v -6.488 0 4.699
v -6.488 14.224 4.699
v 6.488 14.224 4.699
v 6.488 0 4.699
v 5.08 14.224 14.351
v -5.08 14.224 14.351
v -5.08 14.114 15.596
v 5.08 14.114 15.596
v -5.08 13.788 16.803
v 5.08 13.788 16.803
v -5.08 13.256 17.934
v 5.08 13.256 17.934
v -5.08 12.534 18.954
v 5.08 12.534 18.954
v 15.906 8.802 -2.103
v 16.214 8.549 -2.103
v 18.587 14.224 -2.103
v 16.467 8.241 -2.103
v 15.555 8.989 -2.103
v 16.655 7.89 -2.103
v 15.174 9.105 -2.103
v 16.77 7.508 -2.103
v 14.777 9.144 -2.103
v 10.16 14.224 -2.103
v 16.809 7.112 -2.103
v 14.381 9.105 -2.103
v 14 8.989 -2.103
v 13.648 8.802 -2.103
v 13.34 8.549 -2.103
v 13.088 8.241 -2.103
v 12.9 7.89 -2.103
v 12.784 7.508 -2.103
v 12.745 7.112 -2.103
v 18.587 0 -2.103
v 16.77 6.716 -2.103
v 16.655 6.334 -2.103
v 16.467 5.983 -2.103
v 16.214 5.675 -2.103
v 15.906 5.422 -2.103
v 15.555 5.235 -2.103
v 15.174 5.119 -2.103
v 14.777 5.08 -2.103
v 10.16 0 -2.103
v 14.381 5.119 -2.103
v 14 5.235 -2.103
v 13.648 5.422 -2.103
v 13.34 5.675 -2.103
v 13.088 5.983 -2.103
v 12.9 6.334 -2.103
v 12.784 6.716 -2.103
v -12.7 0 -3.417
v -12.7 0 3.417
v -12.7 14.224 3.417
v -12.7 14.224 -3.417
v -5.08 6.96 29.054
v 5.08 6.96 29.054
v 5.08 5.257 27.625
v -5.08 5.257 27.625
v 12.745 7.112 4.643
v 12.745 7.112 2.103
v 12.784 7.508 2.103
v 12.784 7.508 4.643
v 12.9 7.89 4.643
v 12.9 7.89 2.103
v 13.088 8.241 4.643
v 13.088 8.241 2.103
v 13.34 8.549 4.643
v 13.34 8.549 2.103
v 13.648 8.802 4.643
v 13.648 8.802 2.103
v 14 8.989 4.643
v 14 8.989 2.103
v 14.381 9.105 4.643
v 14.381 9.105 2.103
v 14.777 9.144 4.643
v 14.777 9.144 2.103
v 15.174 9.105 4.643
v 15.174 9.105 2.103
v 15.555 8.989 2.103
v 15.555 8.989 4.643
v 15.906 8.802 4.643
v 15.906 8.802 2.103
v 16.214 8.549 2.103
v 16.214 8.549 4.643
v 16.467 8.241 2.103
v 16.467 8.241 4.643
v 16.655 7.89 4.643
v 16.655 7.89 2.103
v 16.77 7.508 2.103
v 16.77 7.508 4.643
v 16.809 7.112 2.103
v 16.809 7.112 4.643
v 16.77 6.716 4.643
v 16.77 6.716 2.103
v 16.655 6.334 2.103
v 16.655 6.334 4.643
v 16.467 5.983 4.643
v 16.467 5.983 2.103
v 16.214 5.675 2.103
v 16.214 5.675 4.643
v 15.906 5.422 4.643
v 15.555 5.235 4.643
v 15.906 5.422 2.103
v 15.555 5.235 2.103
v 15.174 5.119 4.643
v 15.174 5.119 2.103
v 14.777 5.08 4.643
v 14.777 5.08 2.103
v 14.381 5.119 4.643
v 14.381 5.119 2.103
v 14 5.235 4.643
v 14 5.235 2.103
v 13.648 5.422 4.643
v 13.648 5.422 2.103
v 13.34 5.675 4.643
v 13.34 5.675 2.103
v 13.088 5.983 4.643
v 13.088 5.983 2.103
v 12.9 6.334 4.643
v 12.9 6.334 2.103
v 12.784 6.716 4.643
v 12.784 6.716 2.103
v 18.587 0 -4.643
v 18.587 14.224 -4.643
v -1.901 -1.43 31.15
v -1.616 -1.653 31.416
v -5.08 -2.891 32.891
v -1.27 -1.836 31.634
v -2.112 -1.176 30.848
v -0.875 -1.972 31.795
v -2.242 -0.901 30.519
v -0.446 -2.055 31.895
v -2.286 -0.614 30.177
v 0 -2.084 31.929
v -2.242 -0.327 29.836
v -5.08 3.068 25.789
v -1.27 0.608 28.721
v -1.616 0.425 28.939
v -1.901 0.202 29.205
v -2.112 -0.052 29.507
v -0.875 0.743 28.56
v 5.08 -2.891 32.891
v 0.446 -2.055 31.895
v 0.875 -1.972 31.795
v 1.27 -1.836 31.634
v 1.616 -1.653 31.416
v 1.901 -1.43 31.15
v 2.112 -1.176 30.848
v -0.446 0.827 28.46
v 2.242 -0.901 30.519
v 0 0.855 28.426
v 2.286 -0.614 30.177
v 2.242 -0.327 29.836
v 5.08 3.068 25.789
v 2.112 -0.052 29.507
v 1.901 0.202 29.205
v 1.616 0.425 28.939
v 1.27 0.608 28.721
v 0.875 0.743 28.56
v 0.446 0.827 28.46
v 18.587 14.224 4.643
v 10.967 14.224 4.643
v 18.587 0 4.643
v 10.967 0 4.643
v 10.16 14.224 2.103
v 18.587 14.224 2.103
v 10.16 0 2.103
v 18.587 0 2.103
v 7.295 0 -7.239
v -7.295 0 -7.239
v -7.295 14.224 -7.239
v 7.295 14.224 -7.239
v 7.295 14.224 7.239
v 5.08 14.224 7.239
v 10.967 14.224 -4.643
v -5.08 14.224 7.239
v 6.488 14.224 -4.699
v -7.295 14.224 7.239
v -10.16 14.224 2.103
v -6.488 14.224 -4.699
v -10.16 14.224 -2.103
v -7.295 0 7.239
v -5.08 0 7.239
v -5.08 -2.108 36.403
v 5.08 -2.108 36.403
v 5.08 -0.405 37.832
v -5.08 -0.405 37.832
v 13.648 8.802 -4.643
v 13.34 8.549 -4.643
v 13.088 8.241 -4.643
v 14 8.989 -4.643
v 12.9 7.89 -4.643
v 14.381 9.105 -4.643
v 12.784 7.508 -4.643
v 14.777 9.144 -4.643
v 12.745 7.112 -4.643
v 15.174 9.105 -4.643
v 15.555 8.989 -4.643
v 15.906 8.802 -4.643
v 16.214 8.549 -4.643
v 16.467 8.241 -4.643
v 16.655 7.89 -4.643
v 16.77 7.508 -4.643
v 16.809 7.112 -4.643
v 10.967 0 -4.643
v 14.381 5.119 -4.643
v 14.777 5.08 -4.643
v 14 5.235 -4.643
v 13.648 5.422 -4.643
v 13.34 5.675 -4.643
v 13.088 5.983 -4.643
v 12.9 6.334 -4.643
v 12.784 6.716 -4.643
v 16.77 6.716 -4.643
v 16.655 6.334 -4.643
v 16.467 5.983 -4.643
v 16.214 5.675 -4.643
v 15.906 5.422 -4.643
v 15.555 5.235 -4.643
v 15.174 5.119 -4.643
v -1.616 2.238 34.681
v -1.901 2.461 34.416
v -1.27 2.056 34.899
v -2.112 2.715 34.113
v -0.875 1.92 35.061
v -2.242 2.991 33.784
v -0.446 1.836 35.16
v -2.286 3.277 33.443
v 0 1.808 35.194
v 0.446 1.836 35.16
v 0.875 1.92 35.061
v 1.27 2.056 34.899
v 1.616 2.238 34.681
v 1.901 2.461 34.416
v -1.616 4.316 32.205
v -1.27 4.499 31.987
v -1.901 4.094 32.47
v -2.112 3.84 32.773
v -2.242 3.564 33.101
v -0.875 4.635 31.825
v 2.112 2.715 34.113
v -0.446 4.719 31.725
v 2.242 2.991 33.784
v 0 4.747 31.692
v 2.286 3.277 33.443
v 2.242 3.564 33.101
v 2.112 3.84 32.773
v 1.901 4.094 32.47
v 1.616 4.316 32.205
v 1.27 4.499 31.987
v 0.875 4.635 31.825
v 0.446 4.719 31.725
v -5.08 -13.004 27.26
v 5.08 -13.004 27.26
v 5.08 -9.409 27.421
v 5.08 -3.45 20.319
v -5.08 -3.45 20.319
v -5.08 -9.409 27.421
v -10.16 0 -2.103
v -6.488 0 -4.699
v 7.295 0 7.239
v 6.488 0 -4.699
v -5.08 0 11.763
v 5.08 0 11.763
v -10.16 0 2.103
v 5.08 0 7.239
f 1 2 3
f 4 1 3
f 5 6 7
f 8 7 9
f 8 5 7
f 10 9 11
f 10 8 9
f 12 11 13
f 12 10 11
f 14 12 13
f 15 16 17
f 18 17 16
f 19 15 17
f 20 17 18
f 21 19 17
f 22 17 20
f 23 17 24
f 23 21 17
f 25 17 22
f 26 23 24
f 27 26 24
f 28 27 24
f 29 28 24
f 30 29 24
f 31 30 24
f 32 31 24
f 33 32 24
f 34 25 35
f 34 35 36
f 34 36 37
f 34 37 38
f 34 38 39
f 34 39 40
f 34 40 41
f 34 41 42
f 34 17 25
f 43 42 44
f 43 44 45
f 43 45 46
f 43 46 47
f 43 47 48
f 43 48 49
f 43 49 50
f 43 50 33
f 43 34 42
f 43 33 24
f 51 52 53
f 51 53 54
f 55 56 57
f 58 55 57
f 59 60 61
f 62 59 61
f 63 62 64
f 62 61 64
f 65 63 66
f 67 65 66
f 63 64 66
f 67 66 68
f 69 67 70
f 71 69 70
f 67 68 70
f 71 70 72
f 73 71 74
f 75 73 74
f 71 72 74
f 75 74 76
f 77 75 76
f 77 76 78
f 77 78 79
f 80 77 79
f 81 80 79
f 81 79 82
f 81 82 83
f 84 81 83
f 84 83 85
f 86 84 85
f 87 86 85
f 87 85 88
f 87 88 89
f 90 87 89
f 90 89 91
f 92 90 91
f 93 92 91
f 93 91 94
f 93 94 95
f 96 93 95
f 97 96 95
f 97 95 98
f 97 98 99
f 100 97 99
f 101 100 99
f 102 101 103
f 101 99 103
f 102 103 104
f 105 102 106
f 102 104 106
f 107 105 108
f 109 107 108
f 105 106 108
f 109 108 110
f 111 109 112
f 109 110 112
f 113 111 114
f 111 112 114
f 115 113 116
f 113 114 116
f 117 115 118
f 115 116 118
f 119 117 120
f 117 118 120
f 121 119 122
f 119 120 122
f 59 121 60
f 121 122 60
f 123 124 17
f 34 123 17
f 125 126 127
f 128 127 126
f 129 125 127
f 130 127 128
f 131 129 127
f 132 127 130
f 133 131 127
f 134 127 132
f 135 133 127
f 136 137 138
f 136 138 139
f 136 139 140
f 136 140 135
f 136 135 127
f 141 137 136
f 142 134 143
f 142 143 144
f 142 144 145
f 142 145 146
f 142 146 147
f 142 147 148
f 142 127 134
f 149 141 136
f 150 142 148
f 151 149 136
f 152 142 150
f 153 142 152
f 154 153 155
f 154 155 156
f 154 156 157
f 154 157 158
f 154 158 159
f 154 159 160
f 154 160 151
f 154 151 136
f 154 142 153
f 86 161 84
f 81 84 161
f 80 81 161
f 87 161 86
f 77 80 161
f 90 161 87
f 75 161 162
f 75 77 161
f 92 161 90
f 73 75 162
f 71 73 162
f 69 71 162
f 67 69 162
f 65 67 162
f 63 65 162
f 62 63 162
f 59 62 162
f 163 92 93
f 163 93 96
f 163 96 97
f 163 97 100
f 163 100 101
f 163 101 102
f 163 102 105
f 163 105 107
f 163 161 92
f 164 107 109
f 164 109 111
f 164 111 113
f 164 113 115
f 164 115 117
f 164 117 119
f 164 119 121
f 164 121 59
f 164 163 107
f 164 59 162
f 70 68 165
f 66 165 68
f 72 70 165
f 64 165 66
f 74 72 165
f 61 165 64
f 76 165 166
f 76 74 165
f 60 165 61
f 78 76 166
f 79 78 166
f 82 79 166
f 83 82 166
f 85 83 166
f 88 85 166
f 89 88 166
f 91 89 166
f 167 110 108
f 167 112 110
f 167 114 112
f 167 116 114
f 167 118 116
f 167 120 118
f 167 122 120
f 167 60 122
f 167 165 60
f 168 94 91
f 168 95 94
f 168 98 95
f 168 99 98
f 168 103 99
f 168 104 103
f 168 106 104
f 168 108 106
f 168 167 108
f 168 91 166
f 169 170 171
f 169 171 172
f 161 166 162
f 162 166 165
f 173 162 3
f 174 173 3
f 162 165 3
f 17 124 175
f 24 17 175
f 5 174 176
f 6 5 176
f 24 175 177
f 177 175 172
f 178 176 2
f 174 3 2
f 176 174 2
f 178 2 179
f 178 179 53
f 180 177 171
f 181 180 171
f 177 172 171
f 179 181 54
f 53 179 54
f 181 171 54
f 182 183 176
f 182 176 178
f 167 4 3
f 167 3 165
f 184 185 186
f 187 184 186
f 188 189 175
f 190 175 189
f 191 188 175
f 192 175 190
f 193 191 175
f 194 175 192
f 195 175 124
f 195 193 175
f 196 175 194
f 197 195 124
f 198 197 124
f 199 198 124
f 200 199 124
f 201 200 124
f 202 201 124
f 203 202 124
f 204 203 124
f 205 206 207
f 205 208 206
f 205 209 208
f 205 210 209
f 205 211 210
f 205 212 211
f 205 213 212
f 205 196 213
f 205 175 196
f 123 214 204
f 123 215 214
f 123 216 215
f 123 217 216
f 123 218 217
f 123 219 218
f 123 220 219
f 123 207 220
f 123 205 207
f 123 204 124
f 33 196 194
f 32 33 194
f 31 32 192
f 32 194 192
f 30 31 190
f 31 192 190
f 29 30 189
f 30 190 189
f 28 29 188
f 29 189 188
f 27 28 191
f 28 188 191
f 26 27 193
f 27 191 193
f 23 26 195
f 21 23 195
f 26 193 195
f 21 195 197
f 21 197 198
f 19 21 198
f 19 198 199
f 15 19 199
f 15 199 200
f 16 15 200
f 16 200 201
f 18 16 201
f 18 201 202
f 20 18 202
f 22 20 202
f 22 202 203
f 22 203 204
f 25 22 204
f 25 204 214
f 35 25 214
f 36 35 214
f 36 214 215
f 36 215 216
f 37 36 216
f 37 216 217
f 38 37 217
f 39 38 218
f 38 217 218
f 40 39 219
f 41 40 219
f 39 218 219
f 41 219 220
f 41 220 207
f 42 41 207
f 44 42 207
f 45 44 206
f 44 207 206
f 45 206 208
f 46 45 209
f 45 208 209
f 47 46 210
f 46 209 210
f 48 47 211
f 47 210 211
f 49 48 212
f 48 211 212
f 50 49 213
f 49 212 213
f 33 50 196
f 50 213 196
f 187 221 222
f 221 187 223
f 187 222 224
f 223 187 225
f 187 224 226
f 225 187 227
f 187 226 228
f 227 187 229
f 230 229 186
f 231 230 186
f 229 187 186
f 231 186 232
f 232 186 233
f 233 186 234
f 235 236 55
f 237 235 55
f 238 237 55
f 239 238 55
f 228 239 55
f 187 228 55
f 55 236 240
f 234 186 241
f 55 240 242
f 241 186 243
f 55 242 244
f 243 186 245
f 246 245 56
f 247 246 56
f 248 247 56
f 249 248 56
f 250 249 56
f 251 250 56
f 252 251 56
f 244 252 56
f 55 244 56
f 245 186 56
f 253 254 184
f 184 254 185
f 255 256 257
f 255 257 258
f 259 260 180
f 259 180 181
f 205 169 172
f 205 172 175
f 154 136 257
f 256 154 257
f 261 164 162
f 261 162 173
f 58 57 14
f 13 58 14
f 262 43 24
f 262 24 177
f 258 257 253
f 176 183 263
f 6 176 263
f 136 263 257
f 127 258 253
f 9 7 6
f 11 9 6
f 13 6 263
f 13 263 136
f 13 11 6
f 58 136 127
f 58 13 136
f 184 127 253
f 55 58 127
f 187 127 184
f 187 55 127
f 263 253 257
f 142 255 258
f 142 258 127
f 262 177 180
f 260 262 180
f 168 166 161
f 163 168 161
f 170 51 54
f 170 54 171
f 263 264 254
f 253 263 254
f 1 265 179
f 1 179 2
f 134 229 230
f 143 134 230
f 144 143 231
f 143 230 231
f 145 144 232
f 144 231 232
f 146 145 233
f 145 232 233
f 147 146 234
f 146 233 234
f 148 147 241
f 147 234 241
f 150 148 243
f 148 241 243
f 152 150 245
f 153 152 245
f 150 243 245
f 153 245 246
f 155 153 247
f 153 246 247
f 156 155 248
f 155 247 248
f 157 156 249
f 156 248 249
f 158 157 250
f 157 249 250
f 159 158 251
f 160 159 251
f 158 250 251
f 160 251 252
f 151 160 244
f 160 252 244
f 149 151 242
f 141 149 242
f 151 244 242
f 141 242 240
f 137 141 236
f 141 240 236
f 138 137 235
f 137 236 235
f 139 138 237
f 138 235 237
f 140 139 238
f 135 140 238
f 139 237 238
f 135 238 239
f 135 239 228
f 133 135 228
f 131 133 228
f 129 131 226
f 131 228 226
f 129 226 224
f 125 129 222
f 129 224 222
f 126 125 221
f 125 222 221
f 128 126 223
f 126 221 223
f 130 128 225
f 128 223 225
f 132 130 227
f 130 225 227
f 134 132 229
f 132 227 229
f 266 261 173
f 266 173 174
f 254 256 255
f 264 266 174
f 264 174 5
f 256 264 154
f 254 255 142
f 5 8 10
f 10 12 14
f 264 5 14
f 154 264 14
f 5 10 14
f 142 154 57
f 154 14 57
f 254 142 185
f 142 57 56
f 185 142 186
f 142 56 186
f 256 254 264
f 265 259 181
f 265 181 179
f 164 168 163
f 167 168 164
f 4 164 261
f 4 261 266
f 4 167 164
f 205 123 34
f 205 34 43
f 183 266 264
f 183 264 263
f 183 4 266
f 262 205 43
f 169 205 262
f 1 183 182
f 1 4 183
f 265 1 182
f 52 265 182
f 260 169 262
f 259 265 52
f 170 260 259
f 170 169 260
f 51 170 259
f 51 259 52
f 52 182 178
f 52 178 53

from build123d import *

# Parameters (mm, degrees)
BOSS_EXTRUDE1_DEPTH = 14.224
SKETCH2_W           = 10.16
SKETCH2_H           = 14.224
BOSS_EXTRUDE2_DEPTH = 7.112
SKETCH3_W           = 10.16
SKETCH3_H           = 7.112
REVOLVE2_ANGLE      = 180
CUT_EXTRUDE2_REACH  = 37.062
SKETCH5_R           = 2.032
BOSS_EXTRUDE4_DEPTH = 10.16
SKETCH8_R           = 2.286
CUT_EXTRUDE3_DEPTH  = 5.08


with BuildPart() as part:
    # Sketch1 → Boss-Extrude1 (new body)
    with BuildSketch(Plane(origin=(0, 0, 0), x_dir=(1, 0, 0), z_dir=(0, 1, 0))):
        Polygon((-6.487826296, -4.699), (6.487826296, -4.699), (10.16, -2.102598059), (18.587251519, -2.102598059), (18.587251519, -4.642598059), (10.967251519, -4.642598059), (7.295077814, -7.239), (-7.295077814, -7.239), (-12.7, -3.417462245), (-12.7, 3.417462245), (-7.295077814, 7.239), (7.295077814, 7.239), (10.967251519, 4.642598059), (18.587251519, 4.642598059), (18.587251519, 2.102598059), (10.16, 2.102598059), (6.487826296, 4.699), (-6.487826296, 4.699), (-10.16, 2.102598059), (-10.16, -2.102598059), align=None)
    extrude(amount=BOSS_EXTRUDE1_DEPTH)

    # Sketch2 → Boss-Extrude2 (add)
    with BuildSketch(Plane.XY.offset(7.239)):
        with Locations((0, 7.112)):
            Rectangle(SKETCH2_W, SKETCH2_H)
    extrude(amount=BOSS_EXTRUDE2_DEPTH)

    # Sketch3 → Revolve2 (revolve)
    with BuildSketch(Plane.XY.offset(14.351)):
        with Locations((0, 10.668)):
            Rectangle(SKETCH3_W, SKETCH3_H)
    revolve(axis=Axis((-5.08, 7.112, 14.351), (1, 0, 0)), revolution_arc=REVOLVE2_ANGLE)

    # Cut-Extrude2: up to this face of the body (flat: up to its plane)
    cut_extrude2_end = Plane(part.part.faces().sort_by_distance((14.777251519, 7.112, 4.642598059))[0])
    # Sketch5 → Cut-Extrude2 (cut, up to the picked face)
    with BuildSketch(Plane(origin=(0, 0, -4.642598059), x_dir=(-1, 0, 0), z_dir=(0, 0, -1)), mode=Mode.PRIVATE) as cut_extrude2_sk1:
        with Locations((-14.777251519, 7.112)):
            Circle(SKETCH5_R)
    cut_extrude2_tool1 = split(extrude(cut_extrude2_sk1.sketch, amount=-CUT_EXTRUDE2_REACH, mode=Mode.PRIVATE), bisect_by=cut_extrude2_end, keep=Keep.BOTH, mode=Mode.PRIVATE)
    add(cut_extrude2_tool1.solids().sort_by(Axis((14.777252, 7.112, -4.642598), (0, 0, 1)))[0], mode=Mode.SUBTRACT)

    # Sketch7 → Boss-Extrude4 (add)
    with BuildSketch(Plane(origin=(5.08, 0, 0), x_dir=(0, 0, -1), z_dir=(1, 0, 0))):
        Polygon((-27.259989759, -13.003831416), (-36.402849284, -2.10779573), (-37.831520464, -0.405171719), (-29.054109682, 6.959950431), (-27.625438502, 5.25732642), (-18.891073315, 12.586329027), (-9.748213789, 1.690293341), align=None)
        Polygon((-27.421266886, -9.409111436), (-32.890746657, -2.890839269), (-25.788748625, 3.06844466), (-20.319268854, -3.449827506), align=None, mode=Mode.SUBTRACT)
    extrude(amount=-BOSS_EXTRUDE4_DEPTH)

    # Sketch8 → Cut-Extrude3 (cut)
    with BuildSketch(Plane(origin=(0, 18.390622806, 15.431564813), x_dir=(1, 0, 0), z_dir=(0, 0.7660444431189808, 0.642787609686536))):
        with Locations(Location((0, -23.512017379, 0), (0, 0, 270))):
            Circle(SKETCH8_R)
    extrude(amount=-CUT_EXTRUDE3_DEPTH, mode=Mode.SUBTRACT)


solid = part.part
